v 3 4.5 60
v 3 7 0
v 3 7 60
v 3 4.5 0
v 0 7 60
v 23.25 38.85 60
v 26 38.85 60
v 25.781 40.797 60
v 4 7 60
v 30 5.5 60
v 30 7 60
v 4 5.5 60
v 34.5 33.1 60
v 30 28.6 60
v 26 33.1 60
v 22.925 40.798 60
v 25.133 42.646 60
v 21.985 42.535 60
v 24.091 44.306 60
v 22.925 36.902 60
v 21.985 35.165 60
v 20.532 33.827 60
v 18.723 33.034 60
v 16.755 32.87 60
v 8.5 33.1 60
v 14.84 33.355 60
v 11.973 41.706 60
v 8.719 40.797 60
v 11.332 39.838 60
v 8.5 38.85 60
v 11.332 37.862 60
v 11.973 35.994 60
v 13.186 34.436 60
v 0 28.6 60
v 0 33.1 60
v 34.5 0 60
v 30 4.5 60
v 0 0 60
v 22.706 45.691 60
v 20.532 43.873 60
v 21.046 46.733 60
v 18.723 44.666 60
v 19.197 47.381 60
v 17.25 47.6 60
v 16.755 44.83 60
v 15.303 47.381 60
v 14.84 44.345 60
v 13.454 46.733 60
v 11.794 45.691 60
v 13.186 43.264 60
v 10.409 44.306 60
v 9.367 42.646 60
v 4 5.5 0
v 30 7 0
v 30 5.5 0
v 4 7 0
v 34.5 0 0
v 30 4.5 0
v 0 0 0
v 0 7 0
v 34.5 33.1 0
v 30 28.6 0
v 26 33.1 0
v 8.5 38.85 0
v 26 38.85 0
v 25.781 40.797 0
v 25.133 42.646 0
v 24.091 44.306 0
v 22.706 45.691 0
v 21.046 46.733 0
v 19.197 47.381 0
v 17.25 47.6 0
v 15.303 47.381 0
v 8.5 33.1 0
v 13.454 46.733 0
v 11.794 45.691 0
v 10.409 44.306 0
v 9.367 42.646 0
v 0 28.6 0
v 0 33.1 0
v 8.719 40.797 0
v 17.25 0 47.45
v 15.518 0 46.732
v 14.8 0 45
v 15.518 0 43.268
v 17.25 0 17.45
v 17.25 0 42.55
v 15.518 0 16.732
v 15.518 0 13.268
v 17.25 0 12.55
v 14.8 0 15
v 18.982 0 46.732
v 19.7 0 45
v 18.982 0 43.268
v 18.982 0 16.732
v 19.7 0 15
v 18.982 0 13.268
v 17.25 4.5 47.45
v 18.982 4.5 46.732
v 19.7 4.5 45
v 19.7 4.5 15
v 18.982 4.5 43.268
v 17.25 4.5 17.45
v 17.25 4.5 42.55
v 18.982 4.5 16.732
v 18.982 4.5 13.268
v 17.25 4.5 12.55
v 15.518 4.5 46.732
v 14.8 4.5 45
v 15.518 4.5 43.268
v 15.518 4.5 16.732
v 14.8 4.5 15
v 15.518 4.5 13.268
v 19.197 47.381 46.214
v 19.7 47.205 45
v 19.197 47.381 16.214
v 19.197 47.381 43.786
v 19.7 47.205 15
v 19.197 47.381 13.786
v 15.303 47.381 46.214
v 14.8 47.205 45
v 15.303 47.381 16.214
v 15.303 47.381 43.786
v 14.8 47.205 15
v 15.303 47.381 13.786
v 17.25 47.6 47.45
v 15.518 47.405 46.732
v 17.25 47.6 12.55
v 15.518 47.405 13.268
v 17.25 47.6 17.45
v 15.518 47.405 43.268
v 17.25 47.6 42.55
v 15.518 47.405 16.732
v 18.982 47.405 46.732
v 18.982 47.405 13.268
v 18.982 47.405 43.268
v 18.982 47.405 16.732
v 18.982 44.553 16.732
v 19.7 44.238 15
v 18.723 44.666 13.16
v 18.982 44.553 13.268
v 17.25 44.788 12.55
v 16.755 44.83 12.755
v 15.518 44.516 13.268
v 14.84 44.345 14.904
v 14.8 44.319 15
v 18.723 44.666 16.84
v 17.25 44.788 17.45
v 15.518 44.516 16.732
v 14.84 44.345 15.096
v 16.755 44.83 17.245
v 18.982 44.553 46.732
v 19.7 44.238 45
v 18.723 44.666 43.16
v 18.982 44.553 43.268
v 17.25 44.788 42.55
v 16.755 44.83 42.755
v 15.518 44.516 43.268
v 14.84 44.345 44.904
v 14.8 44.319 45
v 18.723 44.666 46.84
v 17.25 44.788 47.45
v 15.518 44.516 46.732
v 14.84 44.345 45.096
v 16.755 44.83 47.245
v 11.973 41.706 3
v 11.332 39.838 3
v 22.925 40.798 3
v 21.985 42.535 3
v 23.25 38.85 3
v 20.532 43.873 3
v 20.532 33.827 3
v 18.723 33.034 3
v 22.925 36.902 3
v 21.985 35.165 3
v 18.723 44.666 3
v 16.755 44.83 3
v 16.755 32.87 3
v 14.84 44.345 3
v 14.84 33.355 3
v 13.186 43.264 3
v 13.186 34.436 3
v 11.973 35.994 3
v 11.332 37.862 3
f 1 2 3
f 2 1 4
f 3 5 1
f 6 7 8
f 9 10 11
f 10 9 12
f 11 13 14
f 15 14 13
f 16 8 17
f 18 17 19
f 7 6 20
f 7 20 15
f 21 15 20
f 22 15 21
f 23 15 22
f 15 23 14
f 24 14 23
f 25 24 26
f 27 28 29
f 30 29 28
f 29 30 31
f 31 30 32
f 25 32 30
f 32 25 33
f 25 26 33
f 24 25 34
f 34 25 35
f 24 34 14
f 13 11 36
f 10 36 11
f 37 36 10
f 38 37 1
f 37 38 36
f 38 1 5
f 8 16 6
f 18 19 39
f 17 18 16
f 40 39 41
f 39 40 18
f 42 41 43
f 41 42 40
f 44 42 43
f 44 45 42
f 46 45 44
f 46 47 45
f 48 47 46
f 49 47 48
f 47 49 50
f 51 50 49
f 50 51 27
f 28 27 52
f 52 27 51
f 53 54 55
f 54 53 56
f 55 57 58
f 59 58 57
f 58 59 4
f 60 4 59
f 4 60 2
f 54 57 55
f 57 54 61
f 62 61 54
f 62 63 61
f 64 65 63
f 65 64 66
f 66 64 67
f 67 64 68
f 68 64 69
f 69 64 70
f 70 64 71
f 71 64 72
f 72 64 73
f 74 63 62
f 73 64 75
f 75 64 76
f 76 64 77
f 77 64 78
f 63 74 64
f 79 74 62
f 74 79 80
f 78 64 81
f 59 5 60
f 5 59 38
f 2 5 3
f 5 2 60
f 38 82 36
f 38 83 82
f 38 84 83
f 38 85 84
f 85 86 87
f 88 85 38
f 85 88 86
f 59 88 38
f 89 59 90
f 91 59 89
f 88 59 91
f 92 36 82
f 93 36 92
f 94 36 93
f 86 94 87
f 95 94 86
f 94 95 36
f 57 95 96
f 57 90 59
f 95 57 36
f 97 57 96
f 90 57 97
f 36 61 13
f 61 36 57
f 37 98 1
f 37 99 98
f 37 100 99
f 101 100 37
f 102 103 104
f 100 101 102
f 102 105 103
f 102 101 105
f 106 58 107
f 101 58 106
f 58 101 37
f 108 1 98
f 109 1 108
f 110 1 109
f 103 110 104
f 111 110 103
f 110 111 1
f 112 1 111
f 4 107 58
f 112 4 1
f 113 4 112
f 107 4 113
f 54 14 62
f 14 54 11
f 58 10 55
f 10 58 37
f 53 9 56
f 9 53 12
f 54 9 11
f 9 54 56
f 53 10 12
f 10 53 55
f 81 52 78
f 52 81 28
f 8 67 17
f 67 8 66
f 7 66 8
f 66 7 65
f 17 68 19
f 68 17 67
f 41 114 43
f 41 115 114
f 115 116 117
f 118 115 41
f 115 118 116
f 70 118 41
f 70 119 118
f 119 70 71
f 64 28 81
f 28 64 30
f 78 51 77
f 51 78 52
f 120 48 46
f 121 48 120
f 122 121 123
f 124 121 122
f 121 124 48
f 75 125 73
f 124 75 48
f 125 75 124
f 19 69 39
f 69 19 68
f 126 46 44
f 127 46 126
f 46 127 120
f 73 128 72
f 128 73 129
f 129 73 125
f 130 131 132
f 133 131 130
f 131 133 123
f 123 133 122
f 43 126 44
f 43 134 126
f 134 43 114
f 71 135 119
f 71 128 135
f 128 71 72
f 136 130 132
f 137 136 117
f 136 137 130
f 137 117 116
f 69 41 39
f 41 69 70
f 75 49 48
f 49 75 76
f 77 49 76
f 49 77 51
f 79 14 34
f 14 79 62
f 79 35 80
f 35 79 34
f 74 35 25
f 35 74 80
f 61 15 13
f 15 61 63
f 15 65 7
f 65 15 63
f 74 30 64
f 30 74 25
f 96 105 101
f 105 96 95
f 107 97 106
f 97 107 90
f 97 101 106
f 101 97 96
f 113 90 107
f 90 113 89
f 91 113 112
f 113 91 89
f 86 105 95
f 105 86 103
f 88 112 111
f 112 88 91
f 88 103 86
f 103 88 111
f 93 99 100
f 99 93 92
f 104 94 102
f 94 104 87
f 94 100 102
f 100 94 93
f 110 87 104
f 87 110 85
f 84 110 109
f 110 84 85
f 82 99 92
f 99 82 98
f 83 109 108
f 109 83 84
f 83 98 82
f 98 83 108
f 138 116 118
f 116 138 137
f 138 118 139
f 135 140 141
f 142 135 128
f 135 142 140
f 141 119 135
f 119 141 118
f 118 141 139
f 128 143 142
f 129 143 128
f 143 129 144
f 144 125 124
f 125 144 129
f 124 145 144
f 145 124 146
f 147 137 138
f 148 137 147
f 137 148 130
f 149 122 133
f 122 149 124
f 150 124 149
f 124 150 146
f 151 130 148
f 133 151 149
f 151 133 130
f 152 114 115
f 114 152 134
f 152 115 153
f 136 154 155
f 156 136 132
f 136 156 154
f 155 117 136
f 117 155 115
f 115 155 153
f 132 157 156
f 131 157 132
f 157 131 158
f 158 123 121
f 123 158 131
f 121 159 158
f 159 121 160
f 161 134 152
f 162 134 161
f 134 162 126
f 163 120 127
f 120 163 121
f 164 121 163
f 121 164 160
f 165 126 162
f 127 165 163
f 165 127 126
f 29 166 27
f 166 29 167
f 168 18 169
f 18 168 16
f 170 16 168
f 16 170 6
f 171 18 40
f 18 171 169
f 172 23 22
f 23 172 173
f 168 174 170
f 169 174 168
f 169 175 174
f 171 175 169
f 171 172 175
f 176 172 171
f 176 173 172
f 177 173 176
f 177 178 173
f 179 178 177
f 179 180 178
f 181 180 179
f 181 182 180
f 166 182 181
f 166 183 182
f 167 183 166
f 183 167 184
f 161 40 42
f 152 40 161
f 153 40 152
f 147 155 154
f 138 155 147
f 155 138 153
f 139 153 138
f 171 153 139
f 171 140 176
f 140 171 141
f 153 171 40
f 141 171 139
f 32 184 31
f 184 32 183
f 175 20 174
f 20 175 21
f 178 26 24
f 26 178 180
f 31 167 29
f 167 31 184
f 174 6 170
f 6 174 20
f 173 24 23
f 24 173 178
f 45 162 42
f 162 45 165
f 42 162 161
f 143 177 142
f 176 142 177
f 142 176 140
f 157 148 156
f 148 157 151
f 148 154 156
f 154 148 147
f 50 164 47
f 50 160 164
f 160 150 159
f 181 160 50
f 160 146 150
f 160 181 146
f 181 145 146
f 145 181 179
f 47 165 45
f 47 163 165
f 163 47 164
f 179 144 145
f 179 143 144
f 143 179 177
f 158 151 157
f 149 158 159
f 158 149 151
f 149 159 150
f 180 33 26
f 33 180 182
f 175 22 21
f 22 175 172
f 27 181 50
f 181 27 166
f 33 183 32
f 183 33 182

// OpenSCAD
//default profile thickness
t=3;
//Diameter of rod to be held
d=11.5;
//extra clearance to be provided to account for thicker than design extrusions (to make up for 3D printer tolerances). This is applied as an extra clearance on all internal openings including screw holes.
clearance=0.25;
//Length of top and bottom sides of the C shaped clamp
l=30;
//Width between the top and bottom sides of the C shaped clamp. i.e. the thickness of the wall/plate/etc to which the bracket is being clamped.
w=21.6;
//Height of the clamp and rod holder. A short clamp will only have 1 screw hole, a long clamp will have 3.
h=60;
//Diameter of the screws (bolts) to be used to pressure the clamp
Dscrew=5;
//thickening factor applied to strengthen the bracket. The higher the factor, the stronger the clamp will be able to be tightened.
n=1.5;



difference() {

union(){ //start solids group
cube([t,n*t+4*clearance+t/2,h]);

cube([l+n*t,n*t,h]);

translate([t+4*clearance,n*t+4*clearance,0]) {
  cube([l-t-4*clearance,t/2,h]);
}

translate([(l+n*t)/2,n*t+4*clearance+t/2+w+n*t+d/2,0]) {
  cylinder(h = h, d=d+2*t);
}

translate([l,n*t,0]) {
  cube([n*t,4*clearance+t/2+w,h]);
}

translate([0,n*t+4*clearance+t/2+w,0]) {
  cube([l+n*t,n*t,h]);
}
translate([(l+n*t-(d+2*t))/2,n*t+4*clearance+t/2+w,0]) {
  cube([d+2*t,d/2+n*t,h]);
}

}//end solids group




union(){//start cut group

translate([(l+n*t)/2,n*t+4*clearance+t/2+w+n*t+d/2,t]) {
  cylinder(h = h-t, d=d+2*clearance);}
}


if(h>=15*Dscrew){
translate([(l+n*t)/2,0,0.25*h]) {
	rotate([-90,0,0]){
	  cylinder(h = n*t, d=Dscrew-0.6+2*clearance);}
	}
translate([(l+n*t)/2,0,0.5*h]) {
	rotate([-90,0,0]){
	  cylinder(h = n*t, d=Dscrew-0.6+2*clearance);}
	}
translate([(l+n*t)/2,0,0.75*h]) {
	rotate([-90,0,0]){
	  cylinder(h = n*t, d=Dscrew-0.6+2*clearance);}
	}
}else if(h>=10*Dscrew){
translate([(l+n*t)/2,0,0.25*h]) {
	rotate([-90,0,0]){
	  cylinder(h = n*t, d=Dscrew-0.6+2*clearance);}
	}
translate([(l+n*t)/2,0,0.75*h]) {
	rotate([-90,0,0]){
	  cylinder(h = n*t, d=Dscrew-0.6+2*clearance);}
	}
}else if(h>=2.5*Dscrew){
translate([(l+n*t)/2,0,h/2]) {
	rotate([-90,0,0]){
	  cylinder(h = n*t, d=Dscrew-0.6+2*clearance);}
	}
}


if(h>=15*Dscrew){
translate([(l+n*t)/2,n*t+4*clearance+t/2+w+n*t+d/2,0.25*h]) {
	rotate([-90,0,0]){
	  cylinder(h = t+d, d=Dscrew-0.6+2*clearance);}
	}
translate([(l+n*t)/2,n*t+4*clearance+t/2+w+n*t+d/2,0.5*h]) {
	rotate([-90,0,0]){
	  cylinder(h = t+d, d=Dscrew-0.6+2*clearance);}
	}
translate([(l+n*t)/2,n*t+4*clearance+t/2+w+n*t+d/2,0.75*h]) {
	rotate([-90,0,0]){
	  cylinder(h = t+d, d=Dscrew-0.6+2*clearance);}
	}
}else if(h>=10*Dscrew){
translate([(l+n*t)/2,n*t+4*clearance+t/2+w+n*t+d/2,0.25*h]) {
	rotate([-90,0,0]){
	  cylinder(h = t+d, d=Dscrew-0.6+2*clearance);}
	}
translate([(l+n*t)/2,n*t+4*clearance+t/2+w+n*t+d/2,0.75*h]) {
	rotate([-90,0,0]){
	  cylinder(h = t+d, d=Dscrew-0.6+2*clearance);}
	}
}else if(h>=2.5*Dscrew){
translate([(l+n*t)/2,n*t+4*clearance+t/2+w+n*t+d/2,h/2]) {
	rotate([-90,0,0]){
	  cylinder(h = t+d, d=Dscrew-0.6+2*clearance);}
	}
}

}//end cut group
